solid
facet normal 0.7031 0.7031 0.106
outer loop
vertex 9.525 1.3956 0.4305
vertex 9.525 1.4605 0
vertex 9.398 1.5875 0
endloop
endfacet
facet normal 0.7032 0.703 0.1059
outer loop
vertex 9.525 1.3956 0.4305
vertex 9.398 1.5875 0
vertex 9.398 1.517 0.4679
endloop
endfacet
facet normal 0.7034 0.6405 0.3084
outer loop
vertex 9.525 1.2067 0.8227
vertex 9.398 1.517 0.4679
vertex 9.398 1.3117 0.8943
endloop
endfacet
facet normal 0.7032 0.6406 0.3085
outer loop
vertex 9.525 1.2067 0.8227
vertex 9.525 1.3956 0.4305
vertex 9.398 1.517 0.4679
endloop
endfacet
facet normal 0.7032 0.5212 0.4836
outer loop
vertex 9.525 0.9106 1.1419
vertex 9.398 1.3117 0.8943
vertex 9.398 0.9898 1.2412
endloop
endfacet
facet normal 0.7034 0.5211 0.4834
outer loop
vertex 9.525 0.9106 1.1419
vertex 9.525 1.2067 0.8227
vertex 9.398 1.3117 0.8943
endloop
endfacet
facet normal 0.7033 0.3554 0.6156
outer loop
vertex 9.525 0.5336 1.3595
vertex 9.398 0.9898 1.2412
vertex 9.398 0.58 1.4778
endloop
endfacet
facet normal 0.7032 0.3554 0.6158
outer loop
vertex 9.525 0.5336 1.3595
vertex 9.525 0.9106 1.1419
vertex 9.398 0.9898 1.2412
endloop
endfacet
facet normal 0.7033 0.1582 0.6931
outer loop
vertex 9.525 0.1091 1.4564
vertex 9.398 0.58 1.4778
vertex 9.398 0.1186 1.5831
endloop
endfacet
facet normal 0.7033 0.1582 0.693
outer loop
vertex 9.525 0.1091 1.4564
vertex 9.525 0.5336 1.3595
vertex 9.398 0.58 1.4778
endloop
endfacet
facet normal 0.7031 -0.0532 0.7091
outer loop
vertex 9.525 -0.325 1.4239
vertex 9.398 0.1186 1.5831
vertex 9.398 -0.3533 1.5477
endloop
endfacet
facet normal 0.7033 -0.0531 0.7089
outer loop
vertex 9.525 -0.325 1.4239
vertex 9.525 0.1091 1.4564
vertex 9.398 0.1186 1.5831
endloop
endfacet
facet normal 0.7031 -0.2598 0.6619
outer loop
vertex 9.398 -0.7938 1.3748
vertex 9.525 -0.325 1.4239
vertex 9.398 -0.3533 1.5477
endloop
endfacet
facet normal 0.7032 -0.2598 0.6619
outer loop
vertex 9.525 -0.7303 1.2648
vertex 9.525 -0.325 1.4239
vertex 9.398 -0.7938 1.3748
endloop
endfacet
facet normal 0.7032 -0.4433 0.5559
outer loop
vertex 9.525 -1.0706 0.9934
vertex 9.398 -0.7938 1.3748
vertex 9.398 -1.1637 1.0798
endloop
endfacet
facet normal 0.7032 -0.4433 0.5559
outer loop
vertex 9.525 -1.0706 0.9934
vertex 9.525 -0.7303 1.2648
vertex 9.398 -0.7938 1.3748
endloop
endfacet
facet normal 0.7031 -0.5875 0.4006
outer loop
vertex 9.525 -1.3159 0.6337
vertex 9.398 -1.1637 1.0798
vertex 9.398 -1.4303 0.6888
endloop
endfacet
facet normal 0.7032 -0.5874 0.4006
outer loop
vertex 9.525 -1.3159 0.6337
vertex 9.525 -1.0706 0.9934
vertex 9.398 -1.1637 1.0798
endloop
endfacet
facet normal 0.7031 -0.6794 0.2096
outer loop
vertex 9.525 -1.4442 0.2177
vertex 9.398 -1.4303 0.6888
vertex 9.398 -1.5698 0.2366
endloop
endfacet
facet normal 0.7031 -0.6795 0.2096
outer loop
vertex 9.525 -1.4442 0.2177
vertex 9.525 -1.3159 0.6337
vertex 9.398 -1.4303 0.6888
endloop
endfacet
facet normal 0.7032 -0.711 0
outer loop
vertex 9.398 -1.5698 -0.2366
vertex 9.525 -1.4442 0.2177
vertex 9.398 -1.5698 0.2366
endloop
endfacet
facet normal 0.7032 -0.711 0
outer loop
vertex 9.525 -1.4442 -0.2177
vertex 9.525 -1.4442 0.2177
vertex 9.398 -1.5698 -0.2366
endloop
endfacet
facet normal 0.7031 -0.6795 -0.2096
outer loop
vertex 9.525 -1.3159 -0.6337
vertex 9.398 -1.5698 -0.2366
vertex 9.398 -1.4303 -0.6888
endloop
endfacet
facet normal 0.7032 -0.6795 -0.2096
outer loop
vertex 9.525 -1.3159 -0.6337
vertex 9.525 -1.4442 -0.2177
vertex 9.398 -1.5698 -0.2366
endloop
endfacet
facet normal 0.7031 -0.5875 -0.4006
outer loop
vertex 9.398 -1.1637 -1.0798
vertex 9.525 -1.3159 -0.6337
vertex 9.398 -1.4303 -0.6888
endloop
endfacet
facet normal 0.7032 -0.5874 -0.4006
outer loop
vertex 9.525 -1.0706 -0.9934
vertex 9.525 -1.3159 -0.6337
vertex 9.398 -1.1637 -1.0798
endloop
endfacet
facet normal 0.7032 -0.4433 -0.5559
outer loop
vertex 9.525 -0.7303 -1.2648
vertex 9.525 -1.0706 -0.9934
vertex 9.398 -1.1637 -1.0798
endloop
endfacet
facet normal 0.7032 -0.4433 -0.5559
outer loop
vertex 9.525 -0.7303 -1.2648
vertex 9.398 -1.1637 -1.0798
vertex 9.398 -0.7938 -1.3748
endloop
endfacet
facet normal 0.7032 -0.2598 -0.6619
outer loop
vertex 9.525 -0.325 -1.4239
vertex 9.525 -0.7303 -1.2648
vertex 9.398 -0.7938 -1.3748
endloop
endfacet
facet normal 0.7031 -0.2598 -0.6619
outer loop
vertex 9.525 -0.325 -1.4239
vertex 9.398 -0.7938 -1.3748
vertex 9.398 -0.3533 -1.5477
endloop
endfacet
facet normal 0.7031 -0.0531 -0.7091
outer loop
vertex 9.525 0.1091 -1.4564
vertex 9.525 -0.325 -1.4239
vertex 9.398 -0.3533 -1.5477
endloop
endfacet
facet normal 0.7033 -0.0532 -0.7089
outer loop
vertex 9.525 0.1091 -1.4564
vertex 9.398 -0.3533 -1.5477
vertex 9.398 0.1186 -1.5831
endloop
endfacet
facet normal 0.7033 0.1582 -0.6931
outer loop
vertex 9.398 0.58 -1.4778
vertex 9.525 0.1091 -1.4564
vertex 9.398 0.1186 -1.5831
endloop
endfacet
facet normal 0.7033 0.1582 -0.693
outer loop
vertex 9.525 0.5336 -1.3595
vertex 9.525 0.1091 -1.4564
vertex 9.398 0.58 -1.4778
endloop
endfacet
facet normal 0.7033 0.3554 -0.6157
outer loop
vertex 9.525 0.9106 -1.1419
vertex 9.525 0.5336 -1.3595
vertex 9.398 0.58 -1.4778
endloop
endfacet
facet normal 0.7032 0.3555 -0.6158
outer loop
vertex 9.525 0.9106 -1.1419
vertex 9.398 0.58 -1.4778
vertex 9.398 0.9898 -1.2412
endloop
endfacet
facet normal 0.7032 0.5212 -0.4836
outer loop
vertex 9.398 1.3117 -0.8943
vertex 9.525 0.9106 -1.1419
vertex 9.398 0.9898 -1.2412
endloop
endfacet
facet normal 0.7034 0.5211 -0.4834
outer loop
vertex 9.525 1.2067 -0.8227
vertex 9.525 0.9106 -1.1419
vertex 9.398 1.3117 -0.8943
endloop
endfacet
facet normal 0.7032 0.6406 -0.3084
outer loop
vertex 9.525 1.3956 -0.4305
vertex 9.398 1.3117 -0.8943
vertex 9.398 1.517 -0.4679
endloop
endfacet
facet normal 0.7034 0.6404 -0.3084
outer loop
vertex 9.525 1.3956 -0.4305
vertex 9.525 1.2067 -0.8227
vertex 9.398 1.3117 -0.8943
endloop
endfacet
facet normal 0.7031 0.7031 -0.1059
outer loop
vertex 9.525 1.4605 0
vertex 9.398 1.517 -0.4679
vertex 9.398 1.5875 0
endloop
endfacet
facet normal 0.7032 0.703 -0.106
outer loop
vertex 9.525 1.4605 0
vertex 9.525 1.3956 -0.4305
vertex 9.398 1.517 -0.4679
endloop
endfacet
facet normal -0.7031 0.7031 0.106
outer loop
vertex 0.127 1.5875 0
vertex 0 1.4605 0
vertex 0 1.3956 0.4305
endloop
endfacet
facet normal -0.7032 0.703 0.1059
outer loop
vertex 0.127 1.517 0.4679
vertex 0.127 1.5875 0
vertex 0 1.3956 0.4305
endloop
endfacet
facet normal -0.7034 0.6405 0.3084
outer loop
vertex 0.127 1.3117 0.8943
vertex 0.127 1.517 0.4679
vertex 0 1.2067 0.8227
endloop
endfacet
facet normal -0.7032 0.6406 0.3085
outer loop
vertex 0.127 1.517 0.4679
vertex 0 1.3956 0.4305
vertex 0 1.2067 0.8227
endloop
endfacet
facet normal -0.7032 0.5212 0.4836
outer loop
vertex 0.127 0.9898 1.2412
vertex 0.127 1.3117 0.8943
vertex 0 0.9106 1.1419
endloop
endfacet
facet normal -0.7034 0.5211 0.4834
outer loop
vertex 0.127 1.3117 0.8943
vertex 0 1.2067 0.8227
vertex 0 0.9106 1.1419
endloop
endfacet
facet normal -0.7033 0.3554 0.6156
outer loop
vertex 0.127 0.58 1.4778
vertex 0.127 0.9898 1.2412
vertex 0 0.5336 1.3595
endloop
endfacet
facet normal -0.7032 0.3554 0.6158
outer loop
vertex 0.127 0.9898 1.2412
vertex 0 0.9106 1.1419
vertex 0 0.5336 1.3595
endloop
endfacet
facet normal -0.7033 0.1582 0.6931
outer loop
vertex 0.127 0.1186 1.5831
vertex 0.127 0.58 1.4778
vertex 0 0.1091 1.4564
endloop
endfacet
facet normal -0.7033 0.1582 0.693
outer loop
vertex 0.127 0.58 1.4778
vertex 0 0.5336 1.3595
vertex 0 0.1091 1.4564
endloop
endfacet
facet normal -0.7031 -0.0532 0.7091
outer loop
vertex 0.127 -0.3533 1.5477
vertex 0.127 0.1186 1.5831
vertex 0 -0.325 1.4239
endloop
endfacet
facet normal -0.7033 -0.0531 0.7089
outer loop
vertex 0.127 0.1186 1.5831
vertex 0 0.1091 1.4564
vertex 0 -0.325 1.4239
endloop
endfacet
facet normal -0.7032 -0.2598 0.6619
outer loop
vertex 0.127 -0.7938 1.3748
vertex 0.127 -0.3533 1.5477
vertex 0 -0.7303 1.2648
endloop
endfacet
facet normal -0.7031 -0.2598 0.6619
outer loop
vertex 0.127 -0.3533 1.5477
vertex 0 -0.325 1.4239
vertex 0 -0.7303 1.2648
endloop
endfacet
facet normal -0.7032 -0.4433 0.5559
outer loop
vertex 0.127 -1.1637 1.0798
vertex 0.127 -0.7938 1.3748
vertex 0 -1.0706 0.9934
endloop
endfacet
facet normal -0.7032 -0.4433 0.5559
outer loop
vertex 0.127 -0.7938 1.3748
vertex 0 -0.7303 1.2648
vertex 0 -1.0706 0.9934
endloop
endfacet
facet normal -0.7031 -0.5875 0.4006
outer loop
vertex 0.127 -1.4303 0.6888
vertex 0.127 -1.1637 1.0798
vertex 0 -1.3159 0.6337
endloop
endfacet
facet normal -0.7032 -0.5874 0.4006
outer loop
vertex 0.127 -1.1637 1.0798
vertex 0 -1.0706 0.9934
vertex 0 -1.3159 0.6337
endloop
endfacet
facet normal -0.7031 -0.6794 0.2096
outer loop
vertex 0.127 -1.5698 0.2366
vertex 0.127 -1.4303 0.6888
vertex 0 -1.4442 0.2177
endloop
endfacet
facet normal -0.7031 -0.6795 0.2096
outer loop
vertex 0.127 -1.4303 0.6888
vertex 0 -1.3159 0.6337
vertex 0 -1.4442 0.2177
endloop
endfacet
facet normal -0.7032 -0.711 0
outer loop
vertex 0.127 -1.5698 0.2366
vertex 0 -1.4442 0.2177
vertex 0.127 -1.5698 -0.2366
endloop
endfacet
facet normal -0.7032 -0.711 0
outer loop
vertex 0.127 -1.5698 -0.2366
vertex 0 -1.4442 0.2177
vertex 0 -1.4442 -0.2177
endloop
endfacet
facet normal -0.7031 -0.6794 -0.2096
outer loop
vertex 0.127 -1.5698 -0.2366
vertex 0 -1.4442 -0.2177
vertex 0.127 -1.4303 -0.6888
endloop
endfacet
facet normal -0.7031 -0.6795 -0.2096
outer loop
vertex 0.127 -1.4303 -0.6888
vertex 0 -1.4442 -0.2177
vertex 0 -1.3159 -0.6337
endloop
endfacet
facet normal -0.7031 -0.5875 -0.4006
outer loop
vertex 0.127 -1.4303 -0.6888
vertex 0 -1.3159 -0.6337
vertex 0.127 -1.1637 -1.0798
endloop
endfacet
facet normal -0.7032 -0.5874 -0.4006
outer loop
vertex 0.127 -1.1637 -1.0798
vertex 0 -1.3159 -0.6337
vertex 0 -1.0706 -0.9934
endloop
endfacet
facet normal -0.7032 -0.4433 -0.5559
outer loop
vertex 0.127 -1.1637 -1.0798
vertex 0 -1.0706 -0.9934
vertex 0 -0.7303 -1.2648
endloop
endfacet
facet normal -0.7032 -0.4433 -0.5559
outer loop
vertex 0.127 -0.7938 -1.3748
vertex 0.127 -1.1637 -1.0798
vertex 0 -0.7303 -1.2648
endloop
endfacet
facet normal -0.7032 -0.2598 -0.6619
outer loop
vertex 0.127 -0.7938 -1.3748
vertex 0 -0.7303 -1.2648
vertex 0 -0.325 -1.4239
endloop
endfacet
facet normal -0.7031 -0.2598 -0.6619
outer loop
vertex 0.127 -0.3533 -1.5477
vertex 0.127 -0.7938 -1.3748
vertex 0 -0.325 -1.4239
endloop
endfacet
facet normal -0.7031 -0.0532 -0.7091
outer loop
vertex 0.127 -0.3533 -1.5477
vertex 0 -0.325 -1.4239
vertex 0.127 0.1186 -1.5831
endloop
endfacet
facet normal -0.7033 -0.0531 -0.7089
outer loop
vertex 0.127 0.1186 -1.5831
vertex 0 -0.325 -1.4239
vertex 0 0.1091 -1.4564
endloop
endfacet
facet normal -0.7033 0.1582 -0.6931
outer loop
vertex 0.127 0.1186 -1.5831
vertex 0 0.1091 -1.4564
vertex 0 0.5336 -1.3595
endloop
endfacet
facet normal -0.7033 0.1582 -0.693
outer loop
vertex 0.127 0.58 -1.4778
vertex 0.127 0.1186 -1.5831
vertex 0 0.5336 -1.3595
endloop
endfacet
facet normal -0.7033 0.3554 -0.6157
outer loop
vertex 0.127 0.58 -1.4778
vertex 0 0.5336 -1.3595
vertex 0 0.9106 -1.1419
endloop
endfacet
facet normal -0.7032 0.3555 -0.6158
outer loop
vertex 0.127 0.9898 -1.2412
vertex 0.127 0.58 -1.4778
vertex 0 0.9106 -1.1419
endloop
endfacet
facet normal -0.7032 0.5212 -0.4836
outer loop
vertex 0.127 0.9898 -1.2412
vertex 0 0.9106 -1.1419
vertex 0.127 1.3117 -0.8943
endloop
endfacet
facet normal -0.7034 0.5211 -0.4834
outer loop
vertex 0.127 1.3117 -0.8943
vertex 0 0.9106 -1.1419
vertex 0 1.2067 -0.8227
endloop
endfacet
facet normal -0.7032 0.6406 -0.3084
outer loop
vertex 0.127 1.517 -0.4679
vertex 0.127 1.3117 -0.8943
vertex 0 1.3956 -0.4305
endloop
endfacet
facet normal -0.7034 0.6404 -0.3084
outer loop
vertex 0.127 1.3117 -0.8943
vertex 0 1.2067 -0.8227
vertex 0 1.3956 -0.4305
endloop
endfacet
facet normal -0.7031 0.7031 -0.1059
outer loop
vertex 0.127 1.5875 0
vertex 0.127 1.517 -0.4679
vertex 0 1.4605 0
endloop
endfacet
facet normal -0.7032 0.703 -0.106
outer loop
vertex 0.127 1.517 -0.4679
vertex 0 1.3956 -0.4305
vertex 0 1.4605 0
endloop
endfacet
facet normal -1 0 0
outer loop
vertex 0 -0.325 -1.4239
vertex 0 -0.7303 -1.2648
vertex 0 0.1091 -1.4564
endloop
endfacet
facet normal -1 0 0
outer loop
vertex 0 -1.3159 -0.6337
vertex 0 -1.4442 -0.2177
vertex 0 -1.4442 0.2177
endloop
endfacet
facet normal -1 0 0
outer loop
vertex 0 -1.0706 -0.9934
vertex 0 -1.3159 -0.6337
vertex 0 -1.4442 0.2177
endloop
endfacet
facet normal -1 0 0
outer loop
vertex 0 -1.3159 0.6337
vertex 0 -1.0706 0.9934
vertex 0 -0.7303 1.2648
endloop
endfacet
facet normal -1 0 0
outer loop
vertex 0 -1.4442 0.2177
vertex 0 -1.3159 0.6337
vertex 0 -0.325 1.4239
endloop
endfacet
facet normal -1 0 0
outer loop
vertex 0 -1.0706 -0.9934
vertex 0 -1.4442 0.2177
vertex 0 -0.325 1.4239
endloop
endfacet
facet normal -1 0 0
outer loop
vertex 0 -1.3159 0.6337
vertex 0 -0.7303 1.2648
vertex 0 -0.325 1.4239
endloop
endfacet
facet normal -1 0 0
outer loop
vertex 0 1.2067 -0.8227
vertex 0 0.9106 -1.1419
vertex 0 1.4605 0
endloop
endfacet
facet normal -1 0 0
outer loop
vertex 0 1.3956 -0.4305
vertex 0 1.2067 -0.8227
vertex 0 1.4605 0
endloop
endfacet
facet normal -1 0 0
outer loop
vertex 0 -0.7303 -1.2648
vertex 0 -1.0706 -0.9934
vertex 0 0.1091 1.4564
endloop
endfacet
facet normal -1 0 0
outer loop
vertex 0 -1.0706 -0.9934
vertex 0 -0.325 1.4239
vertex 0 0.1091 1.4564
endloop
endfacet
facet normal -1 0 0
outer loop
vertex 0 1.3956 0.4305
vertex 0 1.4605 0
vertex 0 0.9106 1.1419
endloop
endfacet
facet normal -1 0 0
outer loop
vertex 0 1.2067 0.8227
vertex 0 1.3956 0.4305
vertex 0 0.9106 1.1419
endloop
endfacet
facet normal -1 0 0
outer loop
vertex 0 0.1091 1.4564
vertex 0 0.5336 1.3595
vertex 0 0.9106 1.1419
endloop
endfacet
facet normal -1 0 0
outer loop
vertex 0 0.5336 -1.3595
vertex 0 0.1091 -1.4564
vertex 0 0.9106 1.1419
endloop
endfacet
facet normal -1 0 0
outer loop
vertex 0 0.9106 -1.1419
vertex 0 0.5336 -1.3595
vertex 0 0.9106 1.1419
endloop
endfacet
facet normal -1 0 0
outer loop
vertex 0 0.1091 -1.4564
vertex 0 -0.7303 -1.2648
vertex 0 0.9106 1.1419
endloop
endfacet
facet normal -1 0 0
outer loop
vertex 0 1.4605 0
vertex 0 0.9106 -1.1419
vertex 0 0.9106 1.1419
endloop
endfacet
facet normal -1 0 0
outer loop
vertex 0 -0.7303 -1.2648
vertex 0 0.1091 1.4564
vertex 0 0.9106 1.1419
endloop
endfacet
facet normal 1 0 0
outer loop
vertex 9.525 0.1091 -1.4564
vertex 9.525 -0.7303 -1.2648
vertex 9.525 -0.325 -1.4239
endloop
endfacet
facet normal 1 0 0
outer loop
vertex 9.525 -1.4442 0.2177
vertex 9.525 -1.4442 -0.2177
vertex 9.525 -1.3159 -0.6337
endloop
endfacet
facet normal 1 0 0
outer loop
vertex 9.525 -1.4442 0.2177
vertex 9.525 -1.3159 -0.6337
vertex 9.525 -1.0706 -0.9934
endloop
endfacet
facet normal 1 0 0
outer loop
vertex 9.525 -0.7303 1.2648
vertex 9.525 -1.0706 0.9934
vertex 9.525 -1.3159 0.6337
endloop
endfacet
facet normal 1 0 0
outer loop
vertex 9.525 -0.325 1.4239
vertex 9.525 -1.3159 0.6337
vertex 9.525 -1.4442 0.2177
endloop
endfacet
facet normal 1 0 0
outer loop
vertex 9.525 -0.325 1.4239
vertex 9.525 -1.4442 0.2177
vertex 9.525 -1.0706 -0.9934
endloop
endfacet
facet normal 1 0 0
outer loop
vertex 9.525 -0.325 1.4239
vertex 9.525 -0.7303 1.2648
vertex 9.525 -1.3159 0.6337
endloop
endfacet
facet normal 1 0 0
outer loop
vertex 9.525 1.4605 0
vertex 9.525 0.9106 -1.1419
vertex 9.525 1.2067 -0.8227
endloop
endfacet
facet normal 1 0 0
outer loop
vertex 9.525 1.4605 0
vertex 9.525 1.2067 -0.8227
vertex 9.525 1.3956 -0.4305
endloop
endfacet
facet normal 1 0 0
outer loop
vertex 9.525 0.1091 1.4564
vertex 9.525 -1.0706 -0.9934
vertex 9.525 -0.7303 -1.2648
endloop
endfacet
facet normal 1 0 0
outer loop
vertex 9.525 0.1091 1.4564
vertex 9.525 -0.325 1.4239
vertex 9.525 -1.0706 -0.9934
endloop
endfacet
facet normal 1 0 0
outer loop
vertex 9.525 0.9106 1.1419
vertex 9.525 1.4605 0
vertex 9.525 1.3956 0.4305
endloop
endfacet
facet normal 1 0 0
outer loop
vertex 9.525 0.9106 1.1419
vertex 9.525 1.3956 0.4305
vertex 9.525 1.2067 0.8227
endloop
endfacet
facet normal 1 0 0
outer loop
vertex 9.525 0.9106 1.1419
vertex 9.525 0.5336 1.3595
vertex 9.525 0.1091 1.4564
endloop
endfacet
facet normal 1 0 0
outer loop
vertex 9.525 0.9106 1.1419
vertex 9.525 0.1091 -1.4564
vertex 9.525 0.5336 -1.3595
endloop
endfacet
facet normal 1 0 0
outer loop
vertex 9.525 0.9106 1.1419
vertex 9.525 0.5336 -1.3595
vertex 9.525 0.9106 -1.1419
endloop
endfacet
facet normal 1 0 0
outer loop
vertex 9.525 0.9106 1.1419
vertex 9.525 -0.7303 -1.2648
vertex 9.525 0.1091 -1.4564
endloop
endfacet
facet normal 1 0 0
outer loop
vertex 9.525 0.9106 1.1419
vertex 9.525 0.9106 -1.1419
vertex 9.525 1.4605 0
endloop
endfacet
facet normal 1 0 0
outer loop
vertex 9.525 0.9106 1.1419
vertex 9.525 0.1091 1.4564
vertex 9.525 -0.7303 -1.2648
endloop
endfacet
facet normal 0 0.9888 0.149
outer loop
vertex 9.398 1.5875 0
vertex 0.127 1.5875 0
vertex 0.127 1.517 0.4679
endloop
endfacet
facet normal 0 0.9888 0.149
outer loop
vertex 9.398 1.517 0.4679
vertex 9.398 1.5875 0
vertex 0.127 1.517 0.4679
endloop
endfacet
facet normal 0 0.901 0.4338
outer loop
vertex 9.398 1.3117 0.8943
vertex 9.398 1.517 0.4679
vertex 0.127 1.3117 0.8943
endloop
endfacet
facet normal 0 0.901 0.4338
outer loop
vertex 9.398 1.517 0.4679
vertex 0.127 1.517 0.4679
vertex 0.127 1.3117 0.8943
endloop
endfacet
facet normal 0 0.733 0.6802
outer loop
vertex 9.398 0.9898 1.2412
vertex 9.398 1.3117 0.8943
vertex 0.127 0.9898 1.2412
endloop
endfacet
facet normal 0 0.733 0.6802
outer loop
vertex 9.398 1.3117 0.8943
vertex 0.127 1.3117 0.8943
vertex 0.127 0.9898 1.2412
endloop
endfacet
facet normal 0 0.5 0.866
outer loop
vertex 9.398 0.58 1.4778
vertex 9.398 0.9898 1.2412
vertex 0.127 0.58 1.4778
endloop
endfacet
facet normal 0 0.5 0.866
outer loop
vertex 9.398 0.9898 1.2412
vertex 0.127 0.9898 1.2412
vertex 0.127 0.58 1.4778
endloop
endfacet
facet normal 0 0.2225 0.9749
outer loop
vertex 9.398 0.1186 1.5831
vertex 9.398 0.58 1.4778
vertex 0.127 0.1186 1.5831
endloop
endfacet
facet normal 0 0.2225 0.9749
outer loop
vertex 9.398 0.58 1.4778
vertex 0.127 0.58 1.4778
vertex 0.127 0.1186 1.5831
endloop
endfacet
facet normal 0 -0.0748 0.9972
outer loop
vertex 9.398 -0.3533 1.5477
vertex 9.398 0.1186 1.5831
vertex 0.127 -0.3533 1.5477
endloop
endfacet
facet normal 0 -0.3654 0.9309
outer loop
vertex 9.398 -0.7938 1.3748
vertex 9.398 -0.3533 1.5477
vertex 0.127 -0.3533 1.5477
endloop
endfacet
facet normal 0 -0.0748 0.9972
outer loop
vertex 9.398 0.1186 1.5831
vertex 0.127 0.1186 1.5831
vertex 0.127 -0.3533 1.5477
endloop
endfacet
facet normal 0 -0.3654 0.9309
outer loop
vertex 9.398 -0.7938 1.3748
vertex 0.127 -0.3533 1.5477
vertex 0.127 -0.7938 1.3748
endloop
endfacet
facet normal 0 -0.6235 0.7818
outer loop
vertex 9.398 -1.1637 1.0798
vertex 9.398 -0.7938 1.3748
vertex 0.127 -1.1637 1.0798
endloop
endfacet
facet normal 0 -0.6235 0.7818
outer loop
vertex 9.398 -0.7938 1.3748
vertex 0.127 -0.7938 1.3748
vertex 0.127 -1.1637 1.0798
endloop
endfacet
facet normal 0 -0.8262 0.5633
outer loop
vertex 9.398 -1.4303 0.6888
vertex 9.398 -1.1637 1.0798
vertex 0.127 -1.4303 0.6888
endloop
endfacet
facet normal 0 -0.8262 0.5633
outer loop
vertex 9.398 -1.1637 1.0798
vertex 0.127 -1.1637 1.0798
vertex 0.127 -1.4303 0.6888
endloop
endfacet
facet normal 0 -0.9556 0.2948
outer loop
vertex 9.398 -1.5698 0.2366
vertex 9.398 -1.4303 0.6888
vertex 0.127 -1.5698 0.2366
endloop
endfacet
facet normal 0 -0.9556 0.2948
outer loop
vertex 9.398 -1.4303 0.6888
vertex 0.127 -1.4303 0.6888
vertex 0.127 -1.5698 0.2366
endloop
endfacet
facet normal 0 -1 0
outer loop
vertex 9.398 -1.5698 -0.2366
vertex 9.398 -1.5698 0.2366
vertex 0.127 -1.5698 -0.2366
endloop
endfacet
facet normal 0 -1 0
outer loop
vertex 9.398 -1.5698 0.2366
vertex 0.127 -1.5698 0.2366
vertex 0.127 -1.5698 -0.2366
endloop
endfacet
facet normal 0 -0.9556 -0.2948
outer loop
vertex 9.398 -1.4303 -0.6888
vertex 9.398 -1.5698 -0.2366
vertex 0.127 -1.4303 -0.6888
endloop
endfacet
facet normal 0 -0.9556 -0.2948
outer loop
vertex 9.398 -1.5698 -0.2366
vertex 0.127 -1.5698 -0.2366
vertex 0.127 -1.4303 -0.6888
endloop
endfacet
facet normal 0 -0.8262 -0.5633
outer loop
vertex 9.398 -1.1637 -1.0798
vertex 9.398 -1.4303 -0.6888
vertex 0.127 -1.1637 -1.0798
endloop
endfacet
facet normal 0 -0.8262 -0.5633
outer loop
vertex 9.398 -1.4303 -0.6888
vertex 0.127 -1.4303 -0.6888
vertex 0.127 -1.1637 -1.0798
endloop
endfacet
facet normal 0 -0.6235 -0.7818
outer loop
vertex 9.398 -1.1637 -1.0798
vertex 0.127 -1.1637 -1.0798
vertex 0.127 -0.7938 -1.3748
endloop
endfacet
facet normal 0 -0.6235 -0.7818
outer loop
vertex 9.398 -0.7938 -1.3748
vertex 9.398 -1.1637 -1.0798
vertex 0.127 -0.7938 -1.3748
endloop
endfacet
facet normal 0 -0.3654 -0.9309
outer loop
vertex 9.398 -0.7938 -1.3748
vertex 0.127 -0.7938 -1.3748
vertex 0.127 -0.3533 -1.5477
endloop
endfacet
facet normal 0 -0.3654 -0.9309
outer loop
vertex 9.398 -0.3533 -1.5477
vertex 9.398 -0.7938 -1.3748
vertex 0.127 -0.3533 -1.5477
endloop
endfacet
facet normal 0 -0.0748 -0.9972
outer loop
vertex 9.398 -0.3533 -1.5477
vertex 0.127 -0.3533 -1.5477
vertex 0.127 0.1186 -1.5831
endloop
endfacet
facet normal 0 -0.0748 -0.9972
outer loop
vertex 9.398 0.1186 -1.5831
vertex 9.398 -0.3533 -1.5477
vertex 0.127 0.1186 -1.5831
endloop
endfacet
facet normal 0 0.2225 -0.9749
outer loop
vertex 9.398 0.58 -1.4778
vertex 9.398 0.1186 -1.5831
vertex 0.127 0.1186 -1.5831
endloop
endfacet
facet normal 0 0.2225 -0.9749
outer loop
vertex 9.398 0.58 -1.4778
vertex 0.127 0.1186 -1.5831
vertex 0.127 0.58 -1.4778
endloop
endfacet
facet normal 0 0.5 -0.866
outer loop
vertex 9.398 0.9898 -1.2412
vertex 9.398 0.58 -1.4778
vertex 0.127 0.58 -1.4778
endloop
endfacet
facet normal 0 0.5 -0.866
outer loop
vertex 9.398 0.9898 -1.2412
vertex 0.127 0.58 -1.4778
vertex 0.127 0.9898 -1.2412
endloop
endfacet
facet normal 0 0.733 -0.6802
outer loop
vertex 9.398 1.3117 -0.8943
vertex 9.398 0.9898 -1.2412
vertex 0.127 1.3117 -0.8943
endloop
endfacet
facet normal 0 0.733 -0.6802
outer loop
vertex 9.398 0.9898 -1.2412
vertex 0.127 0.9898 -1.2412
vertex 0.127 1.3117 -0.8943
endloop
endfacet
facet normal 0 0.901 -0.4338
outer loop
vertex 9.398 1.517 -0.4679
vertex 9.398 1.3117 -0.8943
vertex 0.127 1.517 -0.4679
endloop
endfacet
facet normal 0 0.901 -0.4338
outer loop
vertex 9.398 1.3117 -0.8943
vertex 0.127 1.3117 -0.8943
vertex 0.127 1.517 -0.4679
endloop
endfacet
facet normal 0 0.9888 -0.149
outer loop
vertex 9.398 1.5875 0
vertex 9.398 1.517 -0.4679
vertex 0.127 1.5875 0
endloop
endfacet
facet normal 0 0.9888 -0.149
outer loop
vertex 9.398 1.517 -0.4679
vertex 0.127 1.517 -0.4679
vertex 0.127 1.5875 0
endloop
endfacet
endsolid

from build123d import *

# Parameters (mm, degrees)
F0_R     = 1.5875
F1_DEPTH = 9.525
F2_SIZE  = 0.127
F3_SIZE  = 0.127


with BuildPart() as f1:
    # F0 (on Right) → F1 (new body)
    with BuildSketch(Plane.YZ):
        Circle(F0_R)
    extrude(amount=F1_DEPTH)

    # F2
    f2_edges = [f1.edges().sort_by_distance(p)[0] for p in [
        (9.525, -1.5875, 0),
    ]]
    chamfer(f2_edges, length=F2_SIZE)

    # F3
    f3_edges = [f1.edges().sort_by_distance(p)[0] for p in [
        (0, -1.5875, 0),
    ]]
    chamfer(f3_edges, length=F3_SIZE)


solid = f1.part
